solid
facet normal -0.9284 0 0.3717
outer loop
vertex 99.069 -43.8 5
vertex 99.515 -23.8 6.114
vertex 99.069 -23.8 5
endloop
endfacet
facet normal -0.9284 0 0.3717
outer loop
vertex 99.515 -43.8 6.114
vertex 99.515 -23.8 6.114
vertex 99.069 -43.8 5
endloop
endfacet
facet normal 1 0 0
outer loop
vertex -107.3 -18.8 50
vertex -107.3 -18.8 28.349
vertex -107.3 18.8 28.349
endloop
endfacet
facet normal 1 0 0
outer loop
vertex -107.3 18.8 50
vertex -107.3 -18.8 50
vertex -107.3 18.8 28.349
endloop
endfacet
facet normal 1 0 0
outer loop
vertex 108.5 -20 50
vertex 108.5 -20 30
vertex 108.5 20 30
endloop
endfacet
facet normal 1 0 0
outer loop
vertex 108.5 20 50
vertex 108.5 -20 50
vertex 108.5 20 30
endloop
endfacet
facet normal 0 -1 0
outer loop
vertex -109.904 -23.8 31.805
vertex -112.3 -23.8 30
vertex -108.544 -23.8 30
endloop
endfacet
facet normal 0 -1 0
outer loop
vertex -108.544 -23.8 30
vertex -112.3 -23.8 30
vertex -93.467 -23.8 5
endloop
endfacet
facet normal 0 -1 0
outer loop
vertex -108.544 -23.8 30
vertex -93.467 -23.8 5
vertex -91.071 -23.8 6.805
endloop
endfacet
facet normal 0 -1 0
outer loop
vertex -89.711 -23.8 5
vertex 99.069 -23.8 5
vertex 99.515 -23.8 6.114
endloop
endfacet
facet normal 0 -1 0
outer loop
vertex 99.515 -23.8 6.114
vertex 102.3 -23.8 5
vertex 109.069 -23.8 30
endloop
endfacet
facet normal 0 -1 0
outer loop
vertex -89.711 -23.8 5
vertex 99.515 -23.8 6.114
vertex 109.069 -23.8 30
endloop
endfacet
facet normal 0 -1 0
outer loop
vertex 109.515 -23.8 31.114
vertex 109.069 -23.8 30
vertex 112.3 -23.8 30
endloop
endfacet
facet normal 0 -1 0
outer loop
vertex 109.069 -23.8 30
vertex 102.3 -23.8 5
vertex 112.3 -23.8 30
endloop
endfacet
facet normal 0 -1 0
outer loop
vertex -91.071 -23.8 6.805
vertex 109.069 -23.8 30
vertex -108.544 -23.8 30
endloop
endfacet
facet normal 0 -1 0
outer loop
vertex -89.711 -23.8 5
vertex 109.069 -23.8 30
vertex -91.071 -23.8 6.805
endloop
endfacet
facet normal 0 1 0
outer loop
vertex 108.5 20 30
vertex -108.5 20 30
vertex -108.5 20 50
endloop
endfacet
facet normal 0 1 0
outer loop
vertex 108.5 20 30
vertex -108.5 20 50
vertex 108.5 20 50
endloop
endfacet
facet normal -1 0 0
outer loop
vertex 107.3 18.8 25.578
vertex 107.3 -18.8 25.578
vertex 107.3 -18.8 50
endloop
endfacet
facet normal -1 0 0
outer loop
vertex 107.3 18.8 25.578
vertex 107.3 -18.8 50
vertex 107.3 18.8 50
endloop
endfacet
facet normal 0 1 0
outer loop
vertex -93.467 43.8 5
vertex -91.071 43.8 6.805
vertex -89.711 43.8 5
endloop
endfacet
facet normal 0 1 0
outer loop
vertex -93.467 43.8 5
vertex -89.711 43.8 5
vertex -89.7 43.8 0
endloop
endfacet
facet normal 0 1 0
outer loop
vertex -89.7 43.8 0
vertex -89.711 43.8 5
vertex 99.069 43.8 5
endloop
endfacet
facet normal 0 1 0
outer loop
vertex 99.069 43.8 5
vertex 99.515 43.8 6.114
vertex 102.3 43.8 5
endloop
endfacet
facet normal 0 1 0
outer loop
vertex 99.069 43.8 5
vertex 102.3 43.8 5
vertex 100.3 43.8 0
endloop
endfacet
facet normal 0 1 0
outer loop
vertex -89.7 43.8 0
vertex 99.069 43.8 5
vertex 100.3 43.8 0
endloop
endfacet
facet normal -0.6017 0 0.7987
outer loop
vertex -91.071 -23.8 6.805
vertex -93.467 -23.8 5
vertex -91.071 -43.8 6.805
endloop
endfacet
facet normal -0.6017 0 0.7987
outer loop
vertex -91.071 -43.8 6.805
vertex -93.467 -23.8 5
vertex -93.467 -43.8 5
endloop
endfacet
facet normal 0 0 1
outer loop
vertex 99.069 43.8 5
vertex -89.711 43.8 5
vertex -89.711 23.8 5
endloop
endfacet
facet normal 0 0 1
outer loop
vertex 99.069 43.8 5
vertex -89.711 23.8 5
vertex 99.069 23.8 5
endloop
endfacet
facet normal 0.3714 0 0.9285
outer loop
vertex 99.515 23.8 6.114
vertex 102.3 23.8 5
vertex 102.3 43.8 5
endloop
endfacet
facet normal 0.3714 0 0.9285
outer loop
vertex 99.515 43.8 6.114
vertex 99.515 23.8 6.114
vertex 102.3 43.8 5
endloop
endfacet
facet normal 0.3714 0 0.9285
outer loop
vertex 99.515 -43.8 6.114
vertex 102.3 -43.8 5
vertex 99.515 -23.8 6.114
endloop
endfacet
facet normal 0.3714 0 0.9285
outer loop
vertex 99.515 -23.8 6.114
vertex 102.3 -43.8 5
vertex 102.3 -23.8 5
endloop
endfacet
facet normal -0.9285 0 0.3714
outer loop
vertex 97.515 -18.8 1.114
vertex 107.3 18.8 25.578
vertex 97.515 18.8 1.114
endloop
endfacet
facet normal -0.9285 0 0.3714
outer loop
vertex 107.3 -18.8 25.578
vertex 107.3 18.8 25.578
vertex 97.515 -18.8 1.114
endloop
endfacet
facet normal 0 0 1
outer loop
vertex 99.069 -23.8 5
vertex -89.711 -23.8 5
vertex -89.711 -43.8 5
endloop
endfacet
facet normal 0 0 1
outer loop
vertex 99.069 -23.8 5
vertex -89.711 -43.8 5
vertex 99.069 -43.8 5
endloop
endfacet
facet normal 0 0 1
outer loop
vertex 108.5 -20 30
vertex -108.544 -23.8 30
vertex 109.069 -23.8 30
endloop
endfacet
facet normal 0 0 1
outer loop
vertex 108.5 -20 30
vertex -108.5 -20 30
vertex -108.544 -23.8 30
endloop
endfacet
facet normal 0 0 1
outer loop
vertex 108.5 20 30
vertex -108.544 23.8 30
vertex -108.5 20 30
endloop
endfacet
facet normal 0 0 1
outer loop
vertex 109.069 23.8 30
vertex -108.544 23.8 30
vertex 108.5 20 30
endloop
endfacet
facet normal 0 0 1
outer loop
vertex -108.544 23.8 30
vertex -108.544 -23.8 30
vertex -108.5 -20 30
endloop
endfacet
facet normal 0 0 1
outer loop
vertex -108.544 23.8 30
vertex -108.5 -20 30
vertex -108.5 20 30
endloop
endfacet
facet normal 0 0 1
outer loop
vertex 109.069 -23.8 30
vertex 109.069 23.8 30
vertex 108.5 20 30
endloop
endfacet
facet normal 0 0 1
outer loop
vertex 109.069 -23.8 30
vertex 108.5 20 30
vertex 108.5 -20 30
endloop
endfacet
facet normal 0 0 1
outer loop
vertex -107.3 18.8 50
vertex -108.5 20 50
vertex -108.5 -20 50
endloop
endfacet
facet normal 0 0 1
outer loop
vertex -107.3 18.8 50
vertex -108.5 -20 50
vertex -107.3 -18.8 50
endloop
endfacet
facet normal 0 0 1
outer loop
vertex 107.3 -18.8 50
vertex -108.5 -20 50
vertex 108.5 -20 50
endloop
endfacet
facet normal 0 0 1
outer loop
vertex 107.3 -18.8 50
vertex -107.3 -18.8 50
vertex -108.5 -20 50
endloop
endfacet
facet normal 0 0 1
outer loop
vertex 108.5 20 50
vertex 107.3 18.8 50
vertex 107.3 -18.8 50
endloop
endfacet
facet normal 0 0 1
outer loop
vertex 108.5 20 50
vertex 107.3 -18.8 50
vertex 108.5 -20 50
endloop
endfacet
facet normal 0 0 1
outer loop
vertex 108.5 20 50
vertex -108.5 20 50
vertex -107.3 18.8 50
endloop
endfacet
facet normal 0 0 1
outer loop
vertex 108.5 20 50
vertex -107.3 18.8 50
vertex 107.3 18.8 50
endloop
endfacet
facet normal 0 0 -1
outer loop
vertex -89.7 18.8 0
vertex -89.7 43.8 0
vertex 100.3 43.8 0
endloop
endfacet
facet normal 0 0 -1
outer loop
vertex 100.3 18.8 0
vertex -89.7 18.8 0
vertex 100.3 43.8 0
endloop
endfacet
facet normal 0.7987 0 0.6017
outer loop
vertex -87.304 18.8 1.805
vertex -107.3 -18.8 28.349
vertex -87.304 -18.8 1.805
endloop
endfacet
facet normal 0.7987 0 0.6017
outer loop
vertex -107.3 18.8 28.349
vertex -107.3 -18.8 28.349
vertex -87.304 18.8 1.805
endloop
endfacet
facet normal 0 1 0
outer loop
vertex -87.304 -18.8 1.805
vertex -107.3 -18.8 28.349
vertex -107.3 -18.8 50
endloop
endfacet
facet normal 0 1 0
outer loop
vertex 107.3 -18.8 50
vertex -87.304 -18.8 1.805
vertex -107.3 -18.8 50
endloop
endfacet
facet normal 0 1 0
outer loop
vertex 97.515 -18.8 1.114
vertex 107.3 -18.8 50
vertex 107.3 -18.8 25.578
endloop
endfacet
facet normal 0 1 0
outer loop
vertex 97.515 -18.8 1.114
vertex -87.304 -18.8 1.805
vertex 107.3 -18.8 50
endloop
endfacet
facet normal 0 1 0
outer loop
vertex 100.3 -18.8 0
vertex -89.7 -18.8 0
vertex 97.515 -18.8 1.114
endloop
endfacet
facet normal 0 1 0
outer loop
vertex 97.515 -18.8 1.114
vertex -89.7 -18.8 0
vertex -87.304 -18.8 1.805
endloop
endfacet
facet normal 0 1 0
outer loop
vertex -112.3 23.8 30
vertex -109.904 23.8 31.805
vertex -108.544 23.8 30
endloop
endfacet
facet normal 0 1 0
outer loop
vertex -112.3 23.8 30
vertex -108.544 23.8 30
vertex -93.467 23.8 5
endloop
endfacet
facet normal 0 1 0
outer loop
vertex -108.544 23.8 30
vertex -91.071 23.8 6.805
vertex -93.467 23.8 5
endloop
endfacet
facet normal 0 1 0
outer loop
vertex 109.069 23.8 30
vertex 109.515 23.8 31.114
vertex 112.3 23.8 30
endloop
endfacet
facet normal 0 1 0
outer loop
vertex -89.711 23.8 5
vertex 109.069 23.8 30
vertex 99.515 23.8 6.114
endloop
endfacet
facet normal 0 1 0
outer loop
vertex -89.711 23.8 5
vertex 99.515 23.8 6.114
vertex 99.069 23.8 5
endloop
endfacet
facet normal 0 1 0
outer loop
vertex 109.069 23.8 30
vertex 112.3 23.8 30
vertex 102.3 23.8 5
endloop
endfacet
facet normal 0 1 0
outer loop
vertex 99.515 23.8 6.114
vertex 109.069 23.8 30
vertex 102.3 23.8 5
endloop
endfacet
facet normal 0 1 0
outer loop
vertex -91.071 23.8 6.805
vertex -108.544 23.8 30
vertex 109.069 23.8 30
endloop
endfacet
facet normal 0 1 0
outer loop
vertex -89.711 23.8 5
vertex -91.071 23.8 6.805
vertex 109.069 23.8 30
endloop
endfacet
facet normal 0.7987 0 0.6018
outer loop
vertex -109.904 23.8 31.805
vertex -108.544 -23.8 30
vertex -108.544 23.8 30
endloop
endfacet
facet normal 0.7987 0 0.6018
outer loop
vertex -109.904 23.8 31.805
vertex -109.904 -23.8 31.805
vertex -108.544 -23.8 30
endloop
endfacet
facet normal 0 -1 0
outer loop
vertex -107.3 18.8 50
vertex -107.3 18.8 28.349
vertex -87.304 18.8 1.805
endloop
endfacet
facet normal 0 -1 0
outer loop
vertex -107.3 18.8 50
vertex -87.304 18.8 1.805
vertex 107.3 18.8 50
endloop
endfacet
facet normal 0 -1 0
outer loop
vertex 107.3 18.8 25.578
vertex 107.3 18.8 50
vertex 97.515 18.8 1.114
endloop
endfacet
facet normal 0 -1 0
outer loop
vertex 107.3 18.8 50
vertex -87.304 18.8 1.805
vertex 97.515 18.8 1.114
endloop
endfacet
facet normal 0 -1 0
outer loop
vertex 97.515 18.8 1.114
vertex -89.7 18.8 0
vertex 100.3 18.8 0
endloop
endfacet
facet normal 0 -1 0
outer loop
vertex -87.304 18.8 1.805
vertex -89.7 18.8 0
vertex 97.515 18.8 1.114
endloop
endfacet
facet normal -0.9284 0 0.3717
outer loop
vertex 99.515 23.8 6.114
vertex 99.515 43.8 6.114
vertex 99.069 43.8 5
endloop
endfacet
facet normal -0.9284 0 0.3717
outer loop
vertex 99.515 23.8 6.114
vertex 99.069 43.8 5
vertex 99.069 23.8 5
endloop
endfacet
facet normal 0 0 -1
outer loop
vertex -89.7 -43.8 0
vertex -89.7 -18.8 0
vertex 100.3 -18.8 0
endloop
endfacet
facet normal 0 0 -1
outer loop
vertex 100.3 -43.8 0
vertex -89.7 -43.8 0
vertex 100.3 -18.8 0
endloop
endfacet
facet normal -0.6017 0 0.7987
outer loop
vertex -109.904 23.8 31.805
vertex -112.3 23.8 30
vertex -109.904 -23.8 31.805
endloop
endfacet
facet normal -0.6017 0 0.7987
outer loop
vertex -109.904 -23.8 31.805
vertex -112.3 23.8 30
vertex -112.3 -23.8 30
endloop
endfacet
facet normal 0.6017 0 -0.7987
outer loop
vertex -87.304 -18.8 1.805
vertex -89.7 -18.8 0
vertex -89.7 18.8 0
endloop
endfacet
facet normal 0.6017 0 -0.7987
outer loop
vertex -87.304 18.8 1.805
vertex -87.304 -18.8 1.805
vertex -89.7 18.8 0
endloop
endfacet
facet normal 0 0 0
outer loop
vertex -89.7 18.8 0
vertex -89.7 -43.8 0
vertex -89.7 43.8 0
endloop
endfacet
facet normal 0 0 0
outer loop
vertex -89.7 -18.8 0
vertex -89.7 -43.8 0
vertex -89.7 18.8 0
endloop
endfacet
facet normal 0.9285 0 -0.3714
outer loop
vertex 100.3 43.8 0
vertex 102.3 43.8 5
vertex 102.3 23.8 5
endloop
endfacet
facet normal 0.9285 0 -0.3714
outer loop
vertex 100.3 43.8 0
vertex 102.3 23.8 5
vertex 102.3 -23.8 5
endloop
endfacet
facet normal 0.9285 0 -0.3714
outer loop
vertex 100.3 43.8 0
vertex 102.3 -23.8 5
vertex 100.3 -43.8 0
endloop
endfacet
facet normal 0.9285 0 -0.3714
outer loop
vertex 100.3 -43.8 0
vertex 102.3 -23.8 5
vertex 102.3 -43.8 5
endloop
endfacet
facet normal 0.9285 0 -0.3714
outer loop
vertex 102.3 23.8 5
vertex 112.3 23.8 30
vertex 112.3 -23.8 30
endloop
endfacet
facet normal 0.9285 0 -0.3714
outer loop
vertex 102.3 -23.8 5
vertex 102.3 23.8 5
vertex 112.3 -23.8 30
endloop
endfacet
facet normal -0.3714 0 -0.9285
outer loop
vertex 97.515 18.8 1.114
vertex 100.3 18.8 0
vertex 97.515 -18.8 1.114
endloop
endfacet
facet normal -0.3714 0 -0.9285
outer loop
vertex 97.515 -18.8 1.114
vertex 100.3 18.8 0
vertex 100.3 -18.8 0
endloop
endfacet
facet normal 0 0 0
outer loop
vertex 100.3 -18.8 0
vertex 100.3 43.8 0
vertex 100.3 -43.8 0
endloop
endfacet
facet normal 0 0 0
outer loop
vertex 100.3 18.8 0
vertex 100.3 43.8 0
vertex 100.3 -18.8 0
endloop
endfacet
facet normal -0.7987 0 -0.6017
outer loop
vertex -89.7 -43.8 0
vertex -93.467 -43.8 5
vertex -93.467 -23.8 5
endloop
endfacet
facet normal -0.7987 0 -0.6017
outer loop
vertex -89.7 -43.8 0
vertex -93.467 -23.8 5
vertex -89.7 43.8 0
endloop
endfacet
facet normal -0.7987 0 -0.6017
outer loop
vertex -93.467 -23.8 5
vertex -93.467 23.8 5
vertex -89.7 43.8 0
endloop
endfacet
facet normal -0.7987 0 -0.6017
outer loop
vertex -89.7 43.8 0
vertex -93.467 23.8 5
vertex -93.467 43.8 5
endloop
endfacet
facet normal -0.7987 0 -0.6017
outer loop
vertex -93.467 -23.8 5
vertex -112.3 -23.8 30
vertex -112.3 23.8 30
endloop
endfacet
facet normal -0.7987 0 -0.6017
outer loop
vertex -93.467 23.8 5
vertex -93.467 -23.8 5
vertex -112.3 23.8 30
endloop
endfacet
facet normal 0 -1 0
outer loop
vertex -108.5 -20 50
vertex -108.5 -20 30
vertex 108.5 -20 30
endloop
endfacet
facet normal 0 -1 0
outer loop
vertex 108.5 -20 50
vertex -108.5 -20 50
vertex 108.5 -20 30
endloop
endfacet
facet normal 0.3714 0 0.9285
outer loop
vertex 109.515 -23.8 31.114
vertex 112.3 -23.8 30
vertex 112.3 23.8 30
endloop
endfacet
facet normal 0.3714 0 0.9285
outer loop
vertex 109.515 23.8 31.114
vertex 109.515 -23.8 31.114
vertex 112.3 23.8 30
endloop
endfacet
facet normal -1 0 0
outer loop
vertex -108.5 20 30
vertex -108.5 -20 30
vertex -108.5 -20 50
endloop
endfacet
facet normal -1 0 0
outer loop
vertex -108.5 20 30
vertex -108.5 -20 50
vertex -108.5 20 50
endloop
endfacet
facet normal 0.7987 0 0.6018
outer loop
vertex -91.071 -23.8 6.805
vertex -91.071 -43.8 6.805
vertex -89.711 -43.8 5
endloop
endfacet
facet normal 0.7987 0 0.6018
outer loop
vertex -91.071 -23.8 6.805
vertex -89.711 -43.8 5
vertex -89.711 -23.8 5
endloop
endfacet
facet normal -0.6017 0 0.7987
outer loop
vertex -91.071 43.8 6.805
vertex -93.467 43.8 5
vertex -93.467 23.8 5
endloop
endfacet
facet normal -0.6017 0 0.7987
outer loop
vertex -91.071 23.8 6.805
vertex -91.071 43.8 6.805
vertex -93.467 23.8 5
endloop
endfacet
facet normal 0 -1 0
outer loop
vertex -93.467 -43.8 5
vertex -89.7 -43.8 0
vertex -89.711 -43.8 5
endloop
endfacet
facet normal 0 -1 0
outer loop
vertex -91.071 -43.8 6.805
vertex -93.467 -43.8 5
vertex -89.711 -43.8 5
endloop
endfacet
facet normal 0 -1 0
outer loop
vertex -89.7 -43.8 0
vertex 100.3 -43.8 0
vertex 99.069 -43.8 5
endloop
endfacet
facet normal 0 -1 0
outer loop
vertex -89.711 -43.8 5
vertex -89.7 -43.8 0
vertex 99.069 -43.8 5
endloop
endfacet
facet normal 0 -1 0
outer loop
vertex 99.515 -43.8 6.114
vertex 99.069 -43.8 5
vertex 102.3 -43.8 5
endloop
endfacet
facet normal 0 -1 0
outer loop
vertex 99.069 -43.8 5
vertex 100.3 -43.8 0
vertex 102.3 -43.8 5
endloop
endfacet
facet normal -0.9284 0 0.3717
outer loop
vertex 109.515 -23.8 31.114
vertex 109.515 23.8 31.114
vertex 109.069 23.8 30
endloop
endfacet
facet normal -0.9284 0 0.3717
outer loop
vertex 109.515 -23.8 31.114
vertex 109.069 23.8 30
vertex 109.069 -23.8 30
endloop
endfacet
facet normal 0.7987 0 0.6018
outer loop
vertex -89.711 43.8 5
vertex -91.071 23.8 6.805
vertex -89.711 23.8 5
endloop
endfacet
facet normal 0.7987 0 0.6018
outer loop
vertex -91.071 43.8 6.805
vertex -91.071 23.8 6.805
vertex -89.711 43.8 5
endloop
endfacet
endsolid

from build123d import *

# Parameters (mm, degrees)
SKETCH008_W     = 217
SKETCH008_H     = 40
SKETCH008_W_2   = 214.6
SKETCH008_H_2   = 37.6
PAD006_DEPTH    = 50
SKETCH009_W     = 224.6
SKETCH009_H     = 47.6
SKETCH009_W_2   = 214.6
SKETCH009_H_2   = 37.6
PAD007_DEPTH    = 30
SKETCH010_W     = 224.6
SKETCH010_H     = 20
PAD008_DEPTH    = 5
POCKET001_DEPTH = 87.601
PAD009_DEPTH    = 3
PAD010_DEPTH    = 3


with BuildPart() as part:
    # Sketch008 → Pad006 (new body)
    with BuildSketch(Plane.XY):
        Rectangle(SKETCH008_W, SKETCH008_H)
        Rectangle(SKETCH008_W_2, SKETCH008_H_2, mode=Mode.SUBTRACT)
    extrude(amount=PAD006_DEPTH)

    # Sketch009 → Pad007 (join)
    with BuildSketch(Plane.XY):
        Rectangle(SKETCH009_W, SKETCH009_H)
        Rectangle(SKETCH009_W_2, SKETCH009_H_2, mode=Mode.SUBTRACT)
    extrude(amount=PAD007_DEPTH)

    # Sketch010 → Pad008 (join)
    with BuildSketch(Plane.XY):
        with Locations((0, 33.8)):
            Rectangle(SKETCH010_W, SKETCH010_H)
        with Locations((0, -33.8)):
            Rectangle(SKETCH010_W, SKETCH010_H)
    extrude(amount=PAD008_DEPTH)

    # Sketch011 (on Face1 of Pad008) → Pocket001 (cut, through all)
    with BuildSketch(Plane(origin=(0, 43.8, 0), x_dir=(-1, 0, 0), z_dir=(0, 1, 0))):
        Polygon((-112.3, 30), (-100.3, 0), (-112.3, 0), align=None)
        Polygon((112.3, 30), (89.7, 0), (112.3, 0), align=None)
    extrude(amount=-POCKET001_DEPTH, mode=Mode.SUBTRACT)

    # Sketch012 (on Face5 of Pocket001) → Pad009 (join)
    with BuildSketch(Plane(origin=(-57.224475, 0, -43.109104), x_dir=(0, -1, 0), z_dir=(-0.79872, 0, -0.601703))):
        Polygon((-43.8, 60.232735), (-23.8, 60.232735), (-23.8, 91.532806), (23.8, 91.532806), (23.8, 60.232735), (43.8, 60.232735), (43.8, 53.972721), (-43.8, 53.972721), align=None)
    extrude(amount=-PAD009_DEPTH)

    # Sketch013 (on Face6 of Pad009) → Pad010 (join)
    with BuildSketch(Plane(origin=(86.465517, 0, -34.586207), x_dir=(0, 1, 0), z_dir=(0.928477, 0, -0.371391))):
        Polygon((-23.8, 69.561474), (23.8, 69.561474), (23.8, 42.63565), (43.8, 42.63565), (43.8, 37.250485), (-43.8, 37.250485), (-43.8, 42.63565), (-23.8, 42.63565), align=None)
    extrude(amount=-PAD010_DEPTH)


solid = part.part
